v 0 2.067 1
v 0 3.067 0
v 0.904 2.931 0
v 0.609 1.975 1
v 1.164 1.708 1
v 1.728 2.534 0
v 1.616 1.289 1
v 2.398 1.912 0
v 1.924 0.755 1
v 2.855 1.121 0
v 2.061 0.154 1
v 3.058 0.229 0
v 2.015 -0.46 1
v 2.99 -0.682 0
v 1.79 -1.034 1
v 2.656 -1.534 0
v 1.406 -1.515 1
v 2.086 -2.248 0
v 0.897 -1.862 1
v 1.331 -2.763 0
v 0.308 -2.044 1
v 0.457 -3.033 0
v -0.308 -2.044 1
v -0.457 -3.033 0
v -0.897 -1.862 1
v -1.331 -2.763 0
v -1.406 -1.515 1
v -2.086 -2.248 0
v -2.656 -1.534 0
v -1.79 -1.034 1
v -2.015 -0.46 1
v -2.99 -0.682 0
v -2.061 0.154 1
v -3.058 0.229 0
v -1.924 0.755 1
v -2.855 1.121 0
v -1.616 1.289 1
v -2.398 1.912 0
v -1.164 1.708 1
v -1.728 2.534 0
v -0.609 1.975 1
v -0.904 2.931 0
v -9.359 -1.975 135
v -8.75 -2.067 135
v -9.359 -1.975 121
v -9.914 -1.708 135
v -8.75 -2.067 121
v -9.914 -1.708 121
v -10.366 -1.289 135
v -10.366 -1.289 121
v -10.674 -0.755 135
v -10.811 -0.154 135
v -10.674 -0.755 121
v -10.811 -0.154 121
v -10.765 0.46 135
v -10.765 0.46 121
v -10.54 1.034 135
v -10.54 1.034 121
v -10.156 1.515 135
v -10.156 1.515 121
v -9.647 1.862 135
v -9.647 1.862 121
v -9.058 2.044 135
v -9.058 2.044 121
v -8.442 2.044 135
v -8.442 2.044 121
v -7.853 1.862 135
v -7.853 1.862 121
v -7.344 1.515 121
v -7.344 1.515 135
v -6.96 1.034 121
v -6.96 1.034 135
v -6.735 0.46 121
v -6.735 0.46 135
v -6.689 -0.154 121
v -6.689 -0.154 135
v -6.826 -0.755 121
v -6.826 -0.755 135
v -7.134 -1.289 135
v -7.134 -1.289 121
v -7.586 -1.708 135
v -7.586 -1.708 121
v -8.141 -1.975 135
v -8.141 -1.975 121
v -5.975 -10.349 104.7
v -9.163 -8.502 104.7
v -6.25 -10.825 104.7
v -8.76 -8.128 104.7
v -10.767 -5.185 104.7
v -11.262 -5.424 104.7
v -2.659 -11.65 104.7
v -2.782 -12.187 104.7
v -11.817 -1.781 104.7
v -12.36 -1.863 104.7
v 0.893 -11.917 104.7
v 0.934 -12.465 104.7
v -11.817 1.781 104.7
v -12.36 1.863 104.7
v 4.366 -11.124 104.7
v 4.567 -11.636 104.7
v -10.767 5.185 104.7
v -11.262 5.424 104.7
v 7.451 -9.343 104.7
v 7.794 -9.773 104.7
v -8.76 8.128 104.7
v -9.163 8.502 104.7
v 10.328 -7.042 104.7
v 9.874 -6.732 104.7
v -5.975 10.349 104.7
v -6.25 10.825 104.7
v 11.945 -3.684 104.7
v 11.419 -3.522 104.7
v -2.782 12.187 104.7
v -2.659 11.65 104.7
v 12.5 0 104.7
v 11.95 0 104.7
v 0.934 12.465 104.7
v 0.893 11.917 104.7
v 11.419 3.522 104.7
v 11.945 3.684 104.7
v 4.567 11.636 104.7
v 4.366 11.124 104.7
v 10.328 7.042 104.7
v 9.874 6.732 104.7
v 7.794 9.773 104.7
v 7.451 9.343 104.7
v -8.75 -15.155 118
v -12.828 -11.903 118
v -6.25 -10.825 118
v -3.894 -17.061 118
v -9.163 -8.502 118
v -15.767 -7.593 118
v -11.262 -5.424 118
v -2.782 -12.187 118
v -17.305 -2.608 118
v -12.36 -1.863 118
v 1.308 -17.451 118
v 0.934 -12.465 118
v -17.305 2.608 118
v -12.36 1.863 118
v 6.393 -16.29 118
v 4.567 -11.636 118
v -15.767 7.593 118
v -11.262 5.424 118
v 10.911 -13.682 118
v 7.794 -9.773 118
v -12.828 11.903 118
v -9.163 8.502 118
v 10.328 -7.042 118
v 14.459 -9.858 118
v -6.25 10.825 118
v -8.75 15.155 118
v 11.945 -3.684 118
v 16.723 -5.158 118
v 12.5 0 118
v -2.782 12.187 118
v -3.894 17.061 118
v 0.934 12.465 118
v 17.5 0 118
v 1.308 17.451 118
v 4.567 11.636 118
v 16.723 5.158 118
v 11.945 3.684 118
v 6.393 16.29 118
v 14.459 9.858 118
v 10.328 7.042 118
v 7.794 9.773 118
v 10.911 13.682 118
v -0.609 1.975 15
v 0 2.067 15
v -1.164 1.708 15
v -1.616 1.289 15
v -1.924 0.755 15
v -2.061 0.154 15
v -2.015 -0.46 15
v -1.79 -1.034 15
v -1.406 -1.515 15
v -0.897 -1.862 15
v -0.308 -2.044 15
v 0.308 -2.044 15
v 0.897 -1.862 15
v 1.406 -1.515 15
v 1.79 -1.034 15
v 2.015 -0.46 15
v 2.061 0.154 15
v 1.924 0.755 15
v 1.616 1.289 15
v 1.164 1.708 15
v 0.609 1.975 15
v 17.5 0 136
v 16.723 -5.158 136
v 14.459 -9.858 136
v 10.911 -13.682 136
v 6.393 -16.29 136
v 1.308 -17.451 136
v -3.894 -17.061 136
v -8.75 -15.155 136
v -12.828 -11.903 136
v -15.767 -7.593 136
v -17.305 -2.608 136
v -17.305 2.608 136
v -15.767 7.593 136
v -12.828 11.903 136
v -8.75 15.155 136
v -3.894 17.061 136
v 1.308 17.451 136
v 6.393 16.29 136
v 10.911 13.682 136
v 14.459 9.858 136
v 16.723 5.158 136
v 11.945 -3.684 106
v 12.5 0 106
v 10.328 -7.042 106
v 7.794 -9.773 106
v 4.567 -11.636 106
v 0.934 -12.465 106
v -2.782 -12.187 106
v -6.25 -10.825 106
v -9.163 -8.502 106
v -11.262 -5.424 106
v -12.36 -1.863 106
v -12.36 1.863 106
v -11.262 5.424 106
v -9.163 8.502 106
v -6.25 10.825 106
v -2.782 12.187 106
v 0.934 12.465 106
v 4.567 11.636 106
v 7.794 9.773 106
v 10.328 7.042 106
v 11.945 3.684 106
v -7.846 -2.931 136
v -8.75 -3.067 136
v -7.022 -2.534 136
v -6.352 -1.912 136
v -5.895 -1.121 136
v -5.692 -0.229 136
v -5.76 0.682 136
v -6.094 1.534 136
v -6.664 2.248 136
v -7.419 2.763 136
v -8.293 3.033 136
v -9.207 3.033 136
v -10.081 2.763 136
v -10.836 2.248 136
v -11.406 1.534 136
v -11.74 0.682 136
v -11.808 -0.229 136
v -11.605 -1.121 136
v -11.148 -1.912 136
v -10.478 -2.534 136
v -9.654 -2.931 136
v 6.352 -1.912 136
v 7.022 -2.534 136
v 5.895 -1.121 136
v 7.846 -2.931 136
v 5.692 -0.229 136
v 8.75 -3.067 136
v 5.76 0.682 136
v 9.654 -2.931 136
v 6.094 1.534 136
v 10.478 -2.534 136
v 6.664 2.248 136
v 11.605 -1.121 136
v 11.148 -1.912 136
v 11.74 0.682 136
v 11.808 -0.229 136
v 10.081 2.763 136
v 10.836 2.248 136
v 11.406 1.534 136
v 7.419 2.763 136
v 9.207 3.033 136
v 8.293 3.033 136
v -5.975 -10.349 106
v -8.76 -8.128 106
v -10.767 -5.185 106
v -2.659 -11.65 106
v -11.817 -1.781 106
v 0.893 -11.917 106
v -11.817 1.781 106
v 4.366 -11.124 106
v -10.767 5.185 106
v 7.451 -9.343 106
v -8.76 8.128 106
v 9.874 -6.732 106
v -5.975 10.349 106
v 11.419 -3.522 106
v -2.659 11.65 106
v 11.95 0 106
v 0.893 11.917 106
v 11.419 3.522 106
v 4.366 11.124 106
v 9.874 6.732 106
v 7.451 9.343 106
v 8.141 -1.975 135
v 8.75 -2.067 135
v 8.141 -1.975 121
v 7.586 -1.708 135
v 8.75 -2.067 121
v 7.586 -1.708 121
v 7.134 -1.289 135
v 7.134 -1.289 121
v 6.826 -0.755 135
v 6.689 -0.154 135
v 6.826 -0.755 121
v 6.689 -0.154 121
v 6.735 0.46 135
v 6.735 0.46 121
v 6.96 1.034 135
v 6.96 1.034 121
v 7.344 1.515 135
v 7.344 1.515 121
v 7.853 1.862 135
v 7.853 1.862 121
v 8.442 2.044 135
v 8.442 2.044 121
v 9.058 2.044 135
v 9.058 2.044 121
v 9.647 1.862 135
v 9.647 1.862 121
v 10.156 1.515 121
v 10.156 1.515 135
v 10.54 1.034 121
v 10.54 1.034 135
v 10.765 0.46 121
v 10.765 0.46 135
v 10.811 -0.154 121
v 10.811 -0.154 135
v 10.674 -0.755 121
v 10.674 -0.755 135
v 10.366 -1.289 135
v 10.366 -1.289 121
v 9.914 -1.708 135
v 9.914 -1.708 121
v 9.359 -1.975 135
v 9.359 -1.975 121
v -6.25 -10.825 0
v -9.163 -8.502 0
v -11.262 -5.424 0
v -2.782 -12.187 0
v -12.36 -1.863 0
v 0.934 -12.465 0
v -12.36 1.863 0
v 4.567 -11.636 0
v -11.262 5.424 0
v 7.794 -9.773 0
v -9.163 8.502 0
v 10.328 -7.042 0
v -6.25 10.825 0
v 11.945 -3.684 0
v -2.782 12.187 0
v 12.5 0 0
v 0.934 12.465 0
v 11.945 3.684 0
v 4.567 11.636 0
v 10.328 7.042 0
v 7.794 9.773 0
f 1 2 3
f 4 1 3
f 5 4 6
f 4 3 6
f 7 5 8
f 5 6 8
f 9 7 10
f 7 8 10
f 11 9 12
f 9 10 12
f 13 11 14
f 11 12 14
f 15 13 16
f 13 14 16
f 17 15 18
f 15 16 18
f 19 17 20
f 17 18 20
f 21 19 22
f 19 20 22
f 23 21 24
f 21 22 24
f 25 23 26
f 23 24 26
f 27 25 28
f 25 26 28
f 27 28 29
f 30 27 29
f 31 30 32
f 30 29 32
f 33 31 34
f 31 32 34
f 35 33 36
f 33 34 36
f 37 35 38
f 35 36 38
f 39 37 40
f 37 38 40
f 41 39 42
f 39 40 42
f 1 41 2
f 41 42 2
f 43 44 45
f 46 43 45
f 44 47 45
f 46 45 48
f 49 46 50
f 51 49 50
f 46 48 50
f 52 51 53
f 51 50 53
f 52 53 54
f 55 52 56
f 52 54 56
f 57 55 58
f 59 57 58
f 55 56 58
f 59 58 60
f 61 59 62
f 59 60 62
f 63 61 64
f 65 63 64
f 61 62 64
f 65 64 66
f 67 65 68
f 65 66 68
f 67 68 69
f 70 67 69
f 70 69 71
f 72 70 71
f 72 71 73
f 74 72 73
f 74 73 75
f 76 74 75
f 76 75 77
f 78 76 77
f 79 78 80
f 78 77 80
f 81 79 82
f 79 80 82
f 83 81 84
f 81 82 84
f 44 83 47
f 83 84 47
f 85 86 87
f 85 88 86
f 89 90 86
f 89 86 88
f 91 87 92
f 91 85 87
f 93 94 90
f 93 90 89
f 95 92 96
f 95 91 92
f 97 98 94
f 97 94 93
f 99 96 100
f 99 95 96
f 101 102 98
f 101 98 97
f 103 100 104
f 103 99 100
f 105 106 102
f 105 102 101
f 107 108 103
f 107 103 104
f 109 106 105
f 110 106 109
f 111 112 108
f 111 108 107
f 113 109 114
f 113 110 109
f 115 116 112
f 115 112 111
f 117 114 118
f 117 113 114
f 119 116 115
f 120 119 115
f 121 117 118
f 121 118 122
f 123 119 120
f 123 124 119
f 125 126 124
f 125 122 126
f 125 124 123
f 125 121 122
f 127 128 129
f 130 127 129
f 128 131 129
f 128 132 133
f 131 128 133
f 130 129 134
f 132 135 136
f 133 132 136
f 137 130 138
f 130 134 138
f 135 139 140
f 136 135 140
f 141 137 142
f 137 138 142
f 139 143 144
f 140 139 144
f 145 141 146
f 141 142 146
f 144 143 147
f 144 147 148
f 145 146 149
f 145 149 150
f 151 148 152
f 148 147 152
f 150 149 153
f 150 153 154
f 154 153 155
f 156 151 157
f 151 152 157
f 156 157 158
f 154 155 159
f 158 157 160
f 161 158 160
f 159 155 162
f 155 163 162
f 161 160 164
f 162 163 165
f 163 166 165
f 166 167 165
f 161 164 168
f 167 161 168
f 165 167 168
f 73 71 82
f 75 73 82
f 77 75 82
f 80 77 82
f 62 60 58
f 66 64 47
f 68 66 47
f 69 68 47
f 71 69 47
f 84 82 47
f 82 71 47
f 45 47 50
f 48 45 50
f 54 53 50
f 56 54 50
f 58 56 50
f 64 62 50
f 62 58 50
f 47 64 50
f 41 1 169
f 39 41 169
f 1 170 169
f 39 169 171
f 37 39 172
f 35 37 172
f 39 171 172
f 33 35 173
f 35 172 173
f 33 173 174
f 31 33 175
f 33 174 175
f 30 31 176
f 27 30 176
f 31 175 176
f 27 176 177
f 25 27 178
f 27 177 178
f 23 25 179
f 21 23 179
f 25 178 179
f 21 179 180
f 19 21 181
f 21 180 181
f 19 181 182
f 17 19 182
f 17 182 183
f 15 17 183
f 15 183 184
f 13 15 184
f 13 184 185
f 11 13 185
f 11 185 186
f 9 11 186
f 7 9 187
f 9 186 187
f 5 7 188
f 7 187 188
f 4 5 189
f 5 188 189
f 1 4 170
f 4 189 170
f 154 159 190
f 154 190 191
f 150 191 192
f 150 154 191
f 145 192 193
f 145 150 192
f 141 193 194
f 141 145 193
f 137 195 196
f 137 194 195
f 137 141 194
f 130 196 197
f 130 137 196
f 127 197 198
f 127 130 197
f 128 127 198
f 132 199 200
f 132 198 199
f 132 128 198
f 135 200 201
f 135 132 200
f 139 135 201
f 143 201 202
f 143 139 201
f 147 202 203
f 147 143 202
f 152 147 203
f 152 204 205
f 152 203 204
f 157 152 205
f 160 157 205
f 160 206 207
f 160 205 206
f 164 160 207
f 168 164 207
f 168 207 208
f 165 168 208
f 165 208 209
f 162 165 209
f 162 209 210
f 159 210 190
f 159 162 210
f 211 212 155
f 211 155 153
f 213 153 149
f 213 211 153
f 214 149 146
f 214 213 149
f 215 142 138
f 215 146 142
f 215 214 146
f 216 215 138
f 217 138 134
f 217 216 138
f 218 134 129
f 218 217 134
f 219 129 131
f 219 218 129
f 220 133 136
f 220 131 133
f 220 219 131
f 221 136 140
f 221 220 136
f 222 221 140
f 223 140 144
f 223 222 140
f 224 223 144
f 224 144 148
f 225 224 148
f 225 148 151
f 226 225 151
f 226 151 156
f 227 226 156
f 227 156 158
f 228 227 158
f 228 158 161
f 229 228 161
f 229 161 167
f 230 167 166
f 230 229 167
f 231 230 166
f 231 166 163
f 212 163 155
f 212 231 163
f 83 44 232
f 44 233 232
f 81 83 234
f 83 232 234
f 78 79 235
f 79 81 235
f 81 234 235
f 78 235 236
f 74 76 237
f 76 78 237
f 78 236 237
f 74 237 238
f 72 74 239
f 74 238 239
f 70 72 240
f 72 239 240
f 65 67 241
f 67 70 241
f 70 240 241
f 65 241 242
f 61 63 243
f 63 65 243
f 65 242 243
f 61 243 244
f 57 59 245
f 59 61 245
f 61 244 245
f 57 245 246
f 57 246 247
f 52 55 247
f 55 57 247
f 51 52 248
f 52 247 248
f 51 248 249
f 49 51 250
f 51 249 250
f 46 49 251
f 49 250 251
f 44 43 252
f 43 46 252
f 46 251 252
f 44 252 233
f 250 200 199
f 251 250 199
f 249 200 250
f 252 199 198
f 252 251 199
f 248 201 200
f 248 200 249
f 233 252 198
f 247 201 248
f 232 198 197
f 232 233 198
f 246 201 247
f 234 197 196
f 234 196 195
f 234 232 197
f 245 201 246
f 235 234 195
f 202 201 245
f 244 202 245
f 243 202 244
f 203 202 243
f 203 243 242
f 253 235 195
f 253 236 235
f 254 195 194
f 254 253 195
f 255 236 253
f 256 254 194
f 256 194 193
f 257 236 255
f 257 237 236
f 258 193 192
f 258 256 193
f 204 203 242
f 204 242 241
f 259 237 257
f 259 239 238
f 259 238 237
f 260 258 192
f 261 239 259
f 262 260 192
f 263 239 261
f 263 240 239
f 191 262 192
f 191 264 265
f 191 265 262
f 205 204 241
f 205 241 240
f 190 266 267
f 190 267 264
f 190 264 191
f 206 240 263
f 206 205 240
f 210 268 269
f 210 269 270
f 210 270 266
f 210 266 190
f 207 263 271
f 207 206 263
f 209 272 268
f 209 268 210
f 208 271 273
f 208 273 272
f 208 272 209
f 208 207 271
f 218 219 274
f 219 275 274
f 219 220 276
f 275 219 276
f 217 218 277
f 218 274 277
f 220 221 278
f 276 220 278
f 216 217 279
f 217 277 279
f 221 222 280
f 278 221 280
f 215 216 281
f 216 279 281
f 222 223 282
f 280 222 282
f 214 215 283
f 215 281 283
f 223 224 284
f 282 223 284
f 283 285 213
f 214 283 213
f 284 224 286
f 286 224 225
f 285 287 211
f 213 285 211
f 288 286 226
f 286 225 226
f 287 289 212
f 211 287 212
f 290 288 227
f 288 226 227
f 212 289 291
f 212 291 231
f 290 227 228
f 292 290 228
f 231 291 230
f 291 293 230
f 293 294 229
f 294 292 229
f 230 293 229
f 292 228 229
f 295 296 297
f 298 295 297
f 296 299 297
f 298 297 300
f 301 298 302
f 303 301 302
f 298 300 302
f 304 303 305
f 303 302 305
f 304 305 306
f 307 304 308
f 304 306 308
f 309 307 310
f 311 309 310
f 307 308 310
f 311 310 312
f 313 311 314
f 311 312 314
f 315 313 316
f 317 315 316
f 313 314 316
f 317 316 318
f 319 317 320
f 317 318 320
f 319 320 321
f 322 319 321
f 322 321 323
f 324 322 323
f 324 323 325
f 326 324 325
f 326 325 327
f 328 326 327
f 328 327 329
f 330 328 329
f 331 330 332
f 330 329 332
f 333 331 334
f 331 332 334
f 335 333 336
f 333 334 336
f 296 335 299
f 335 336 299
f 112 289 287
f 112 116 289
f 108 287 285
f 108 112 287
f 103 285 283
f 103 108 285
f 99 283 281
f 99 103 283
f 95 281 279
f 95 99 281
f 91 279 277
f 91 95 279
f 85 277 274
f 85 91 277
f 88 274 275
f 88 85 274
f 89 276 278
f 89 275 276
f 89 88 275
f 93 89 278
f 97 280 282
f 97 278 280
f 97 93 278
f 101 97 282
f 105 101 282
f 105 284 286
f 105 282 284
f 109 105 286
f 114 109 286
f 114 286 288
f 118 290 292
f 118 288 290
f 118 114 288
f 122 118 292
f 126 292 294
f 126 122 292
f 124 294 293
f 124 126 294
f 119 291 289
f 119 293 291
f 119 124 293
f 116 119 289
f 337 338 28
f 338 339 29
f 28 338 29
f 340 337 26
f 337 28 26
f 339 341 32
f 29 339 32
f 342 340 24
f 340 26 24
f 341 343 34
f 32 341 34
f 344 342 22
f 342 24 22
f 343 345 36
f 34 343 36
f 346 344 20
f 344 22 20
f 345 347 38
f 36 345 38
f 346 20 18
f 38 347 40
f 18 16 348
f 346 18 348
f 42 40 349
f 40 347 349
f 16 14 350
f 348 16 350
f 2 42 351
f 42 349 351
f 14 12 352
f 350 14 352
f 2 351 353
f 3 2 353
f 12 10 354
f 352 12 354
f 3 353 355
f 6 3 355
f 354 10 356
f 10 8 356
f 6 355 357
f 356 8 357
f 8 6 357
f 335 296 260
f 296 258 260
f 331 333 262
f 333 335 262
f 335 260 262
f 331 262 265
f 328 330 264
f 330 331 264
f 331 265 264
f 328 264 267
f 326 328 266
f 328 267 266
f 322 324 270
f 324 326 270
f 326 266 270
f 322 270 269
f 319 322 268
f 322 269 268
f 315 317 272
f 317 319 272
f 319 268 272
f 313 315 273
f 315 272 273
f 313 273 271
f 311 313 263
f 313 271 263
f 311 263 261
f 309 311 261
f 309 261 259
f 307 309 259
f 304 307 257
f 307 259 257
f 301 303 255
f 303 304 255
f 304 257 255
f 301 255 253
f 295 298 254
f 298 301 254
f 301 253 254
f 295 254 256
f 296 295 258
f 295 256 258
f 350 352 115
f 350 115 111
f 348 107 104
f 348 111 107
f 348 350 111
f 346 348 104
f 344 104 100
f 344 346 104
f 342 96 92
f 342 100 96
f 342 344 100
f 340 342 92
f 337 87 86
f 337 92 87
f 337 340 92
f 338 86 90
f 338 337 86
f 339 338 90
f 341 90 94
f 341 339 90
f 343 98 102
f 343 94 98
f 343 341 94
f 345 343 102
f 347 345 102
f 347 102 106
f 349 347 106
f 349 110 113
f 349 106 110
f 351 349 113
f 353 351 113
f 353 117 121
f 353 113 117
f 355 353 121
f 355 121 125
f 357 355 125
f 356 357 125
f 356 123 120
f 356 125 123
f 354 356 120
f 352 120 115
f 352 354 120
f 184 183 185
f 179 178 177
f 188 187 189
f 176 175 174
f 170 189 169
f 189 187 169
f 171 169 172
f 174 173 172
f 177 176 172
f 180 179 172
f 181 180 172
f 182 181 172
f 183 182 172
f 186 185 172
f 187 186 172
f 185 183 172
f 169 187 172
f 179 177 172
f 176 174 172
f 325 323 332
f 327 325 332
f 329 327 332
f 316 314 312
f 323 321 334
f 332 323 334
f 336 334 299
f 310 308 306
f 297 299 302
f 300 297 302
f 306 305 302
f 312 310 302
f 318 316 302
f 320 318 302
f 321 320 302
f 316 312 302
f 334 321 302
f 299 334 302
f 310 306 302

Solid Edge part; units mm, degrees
sketch "Sketch1" plane through (0, 0, 0) normal (0, -1, 0) x (1, 0, 0)
  line L0 (0, 0) -> (0, 136)
  line L1 (0, 136) -> (17.5, 136)
  line L2 (17.5, 136) -> (17.5, 118)
  line L3 (17.5, 118) -> (12.5, 118)
  line L4 (12.5, 118) -> (12.5, 106)
  line L5 (12.5, 106) -> (11.95, 106)
  line L6 (11.95, 106) -> (11.95, 104.7)
  line L7 (11.95, 104.7) -> (12.5, 104.7)
  line L8 (12.5, 104.7) -> (12.5, 0)
  line L9 (12.5, 0) -> (0, 0)
  dimension "D1" = 17.5
  dimension "D2" = 12.5
  dimension "D3" = 11.95
  dimension "D4" = 1.3
  dimension "D5" = 104.7
  dimension "D6" = 18
  dimension "D7" = 12
revolve "RevolvedProtrusion1" add sketch "Sketch1" angle 360 about axis through (0, 0, 0) along (0, 0, 1)
hole "Hole1" at (8.75, 0, 136) direction (0, 0, -1) diameter 4.134 depth 15 start chamfer 1 start chamfer angle 45
hole "Hole2" at (-8.75, 0, 136) direction (0, 0, -1) diameter 4.134 depth 15 start chamfer 1 start chamfer angle 45
hole "v_1" at (0, 0, 0) direction (0, 0, 1) diameter 4.134 depth 15 start chamfer 1 start chamfer angle 45
